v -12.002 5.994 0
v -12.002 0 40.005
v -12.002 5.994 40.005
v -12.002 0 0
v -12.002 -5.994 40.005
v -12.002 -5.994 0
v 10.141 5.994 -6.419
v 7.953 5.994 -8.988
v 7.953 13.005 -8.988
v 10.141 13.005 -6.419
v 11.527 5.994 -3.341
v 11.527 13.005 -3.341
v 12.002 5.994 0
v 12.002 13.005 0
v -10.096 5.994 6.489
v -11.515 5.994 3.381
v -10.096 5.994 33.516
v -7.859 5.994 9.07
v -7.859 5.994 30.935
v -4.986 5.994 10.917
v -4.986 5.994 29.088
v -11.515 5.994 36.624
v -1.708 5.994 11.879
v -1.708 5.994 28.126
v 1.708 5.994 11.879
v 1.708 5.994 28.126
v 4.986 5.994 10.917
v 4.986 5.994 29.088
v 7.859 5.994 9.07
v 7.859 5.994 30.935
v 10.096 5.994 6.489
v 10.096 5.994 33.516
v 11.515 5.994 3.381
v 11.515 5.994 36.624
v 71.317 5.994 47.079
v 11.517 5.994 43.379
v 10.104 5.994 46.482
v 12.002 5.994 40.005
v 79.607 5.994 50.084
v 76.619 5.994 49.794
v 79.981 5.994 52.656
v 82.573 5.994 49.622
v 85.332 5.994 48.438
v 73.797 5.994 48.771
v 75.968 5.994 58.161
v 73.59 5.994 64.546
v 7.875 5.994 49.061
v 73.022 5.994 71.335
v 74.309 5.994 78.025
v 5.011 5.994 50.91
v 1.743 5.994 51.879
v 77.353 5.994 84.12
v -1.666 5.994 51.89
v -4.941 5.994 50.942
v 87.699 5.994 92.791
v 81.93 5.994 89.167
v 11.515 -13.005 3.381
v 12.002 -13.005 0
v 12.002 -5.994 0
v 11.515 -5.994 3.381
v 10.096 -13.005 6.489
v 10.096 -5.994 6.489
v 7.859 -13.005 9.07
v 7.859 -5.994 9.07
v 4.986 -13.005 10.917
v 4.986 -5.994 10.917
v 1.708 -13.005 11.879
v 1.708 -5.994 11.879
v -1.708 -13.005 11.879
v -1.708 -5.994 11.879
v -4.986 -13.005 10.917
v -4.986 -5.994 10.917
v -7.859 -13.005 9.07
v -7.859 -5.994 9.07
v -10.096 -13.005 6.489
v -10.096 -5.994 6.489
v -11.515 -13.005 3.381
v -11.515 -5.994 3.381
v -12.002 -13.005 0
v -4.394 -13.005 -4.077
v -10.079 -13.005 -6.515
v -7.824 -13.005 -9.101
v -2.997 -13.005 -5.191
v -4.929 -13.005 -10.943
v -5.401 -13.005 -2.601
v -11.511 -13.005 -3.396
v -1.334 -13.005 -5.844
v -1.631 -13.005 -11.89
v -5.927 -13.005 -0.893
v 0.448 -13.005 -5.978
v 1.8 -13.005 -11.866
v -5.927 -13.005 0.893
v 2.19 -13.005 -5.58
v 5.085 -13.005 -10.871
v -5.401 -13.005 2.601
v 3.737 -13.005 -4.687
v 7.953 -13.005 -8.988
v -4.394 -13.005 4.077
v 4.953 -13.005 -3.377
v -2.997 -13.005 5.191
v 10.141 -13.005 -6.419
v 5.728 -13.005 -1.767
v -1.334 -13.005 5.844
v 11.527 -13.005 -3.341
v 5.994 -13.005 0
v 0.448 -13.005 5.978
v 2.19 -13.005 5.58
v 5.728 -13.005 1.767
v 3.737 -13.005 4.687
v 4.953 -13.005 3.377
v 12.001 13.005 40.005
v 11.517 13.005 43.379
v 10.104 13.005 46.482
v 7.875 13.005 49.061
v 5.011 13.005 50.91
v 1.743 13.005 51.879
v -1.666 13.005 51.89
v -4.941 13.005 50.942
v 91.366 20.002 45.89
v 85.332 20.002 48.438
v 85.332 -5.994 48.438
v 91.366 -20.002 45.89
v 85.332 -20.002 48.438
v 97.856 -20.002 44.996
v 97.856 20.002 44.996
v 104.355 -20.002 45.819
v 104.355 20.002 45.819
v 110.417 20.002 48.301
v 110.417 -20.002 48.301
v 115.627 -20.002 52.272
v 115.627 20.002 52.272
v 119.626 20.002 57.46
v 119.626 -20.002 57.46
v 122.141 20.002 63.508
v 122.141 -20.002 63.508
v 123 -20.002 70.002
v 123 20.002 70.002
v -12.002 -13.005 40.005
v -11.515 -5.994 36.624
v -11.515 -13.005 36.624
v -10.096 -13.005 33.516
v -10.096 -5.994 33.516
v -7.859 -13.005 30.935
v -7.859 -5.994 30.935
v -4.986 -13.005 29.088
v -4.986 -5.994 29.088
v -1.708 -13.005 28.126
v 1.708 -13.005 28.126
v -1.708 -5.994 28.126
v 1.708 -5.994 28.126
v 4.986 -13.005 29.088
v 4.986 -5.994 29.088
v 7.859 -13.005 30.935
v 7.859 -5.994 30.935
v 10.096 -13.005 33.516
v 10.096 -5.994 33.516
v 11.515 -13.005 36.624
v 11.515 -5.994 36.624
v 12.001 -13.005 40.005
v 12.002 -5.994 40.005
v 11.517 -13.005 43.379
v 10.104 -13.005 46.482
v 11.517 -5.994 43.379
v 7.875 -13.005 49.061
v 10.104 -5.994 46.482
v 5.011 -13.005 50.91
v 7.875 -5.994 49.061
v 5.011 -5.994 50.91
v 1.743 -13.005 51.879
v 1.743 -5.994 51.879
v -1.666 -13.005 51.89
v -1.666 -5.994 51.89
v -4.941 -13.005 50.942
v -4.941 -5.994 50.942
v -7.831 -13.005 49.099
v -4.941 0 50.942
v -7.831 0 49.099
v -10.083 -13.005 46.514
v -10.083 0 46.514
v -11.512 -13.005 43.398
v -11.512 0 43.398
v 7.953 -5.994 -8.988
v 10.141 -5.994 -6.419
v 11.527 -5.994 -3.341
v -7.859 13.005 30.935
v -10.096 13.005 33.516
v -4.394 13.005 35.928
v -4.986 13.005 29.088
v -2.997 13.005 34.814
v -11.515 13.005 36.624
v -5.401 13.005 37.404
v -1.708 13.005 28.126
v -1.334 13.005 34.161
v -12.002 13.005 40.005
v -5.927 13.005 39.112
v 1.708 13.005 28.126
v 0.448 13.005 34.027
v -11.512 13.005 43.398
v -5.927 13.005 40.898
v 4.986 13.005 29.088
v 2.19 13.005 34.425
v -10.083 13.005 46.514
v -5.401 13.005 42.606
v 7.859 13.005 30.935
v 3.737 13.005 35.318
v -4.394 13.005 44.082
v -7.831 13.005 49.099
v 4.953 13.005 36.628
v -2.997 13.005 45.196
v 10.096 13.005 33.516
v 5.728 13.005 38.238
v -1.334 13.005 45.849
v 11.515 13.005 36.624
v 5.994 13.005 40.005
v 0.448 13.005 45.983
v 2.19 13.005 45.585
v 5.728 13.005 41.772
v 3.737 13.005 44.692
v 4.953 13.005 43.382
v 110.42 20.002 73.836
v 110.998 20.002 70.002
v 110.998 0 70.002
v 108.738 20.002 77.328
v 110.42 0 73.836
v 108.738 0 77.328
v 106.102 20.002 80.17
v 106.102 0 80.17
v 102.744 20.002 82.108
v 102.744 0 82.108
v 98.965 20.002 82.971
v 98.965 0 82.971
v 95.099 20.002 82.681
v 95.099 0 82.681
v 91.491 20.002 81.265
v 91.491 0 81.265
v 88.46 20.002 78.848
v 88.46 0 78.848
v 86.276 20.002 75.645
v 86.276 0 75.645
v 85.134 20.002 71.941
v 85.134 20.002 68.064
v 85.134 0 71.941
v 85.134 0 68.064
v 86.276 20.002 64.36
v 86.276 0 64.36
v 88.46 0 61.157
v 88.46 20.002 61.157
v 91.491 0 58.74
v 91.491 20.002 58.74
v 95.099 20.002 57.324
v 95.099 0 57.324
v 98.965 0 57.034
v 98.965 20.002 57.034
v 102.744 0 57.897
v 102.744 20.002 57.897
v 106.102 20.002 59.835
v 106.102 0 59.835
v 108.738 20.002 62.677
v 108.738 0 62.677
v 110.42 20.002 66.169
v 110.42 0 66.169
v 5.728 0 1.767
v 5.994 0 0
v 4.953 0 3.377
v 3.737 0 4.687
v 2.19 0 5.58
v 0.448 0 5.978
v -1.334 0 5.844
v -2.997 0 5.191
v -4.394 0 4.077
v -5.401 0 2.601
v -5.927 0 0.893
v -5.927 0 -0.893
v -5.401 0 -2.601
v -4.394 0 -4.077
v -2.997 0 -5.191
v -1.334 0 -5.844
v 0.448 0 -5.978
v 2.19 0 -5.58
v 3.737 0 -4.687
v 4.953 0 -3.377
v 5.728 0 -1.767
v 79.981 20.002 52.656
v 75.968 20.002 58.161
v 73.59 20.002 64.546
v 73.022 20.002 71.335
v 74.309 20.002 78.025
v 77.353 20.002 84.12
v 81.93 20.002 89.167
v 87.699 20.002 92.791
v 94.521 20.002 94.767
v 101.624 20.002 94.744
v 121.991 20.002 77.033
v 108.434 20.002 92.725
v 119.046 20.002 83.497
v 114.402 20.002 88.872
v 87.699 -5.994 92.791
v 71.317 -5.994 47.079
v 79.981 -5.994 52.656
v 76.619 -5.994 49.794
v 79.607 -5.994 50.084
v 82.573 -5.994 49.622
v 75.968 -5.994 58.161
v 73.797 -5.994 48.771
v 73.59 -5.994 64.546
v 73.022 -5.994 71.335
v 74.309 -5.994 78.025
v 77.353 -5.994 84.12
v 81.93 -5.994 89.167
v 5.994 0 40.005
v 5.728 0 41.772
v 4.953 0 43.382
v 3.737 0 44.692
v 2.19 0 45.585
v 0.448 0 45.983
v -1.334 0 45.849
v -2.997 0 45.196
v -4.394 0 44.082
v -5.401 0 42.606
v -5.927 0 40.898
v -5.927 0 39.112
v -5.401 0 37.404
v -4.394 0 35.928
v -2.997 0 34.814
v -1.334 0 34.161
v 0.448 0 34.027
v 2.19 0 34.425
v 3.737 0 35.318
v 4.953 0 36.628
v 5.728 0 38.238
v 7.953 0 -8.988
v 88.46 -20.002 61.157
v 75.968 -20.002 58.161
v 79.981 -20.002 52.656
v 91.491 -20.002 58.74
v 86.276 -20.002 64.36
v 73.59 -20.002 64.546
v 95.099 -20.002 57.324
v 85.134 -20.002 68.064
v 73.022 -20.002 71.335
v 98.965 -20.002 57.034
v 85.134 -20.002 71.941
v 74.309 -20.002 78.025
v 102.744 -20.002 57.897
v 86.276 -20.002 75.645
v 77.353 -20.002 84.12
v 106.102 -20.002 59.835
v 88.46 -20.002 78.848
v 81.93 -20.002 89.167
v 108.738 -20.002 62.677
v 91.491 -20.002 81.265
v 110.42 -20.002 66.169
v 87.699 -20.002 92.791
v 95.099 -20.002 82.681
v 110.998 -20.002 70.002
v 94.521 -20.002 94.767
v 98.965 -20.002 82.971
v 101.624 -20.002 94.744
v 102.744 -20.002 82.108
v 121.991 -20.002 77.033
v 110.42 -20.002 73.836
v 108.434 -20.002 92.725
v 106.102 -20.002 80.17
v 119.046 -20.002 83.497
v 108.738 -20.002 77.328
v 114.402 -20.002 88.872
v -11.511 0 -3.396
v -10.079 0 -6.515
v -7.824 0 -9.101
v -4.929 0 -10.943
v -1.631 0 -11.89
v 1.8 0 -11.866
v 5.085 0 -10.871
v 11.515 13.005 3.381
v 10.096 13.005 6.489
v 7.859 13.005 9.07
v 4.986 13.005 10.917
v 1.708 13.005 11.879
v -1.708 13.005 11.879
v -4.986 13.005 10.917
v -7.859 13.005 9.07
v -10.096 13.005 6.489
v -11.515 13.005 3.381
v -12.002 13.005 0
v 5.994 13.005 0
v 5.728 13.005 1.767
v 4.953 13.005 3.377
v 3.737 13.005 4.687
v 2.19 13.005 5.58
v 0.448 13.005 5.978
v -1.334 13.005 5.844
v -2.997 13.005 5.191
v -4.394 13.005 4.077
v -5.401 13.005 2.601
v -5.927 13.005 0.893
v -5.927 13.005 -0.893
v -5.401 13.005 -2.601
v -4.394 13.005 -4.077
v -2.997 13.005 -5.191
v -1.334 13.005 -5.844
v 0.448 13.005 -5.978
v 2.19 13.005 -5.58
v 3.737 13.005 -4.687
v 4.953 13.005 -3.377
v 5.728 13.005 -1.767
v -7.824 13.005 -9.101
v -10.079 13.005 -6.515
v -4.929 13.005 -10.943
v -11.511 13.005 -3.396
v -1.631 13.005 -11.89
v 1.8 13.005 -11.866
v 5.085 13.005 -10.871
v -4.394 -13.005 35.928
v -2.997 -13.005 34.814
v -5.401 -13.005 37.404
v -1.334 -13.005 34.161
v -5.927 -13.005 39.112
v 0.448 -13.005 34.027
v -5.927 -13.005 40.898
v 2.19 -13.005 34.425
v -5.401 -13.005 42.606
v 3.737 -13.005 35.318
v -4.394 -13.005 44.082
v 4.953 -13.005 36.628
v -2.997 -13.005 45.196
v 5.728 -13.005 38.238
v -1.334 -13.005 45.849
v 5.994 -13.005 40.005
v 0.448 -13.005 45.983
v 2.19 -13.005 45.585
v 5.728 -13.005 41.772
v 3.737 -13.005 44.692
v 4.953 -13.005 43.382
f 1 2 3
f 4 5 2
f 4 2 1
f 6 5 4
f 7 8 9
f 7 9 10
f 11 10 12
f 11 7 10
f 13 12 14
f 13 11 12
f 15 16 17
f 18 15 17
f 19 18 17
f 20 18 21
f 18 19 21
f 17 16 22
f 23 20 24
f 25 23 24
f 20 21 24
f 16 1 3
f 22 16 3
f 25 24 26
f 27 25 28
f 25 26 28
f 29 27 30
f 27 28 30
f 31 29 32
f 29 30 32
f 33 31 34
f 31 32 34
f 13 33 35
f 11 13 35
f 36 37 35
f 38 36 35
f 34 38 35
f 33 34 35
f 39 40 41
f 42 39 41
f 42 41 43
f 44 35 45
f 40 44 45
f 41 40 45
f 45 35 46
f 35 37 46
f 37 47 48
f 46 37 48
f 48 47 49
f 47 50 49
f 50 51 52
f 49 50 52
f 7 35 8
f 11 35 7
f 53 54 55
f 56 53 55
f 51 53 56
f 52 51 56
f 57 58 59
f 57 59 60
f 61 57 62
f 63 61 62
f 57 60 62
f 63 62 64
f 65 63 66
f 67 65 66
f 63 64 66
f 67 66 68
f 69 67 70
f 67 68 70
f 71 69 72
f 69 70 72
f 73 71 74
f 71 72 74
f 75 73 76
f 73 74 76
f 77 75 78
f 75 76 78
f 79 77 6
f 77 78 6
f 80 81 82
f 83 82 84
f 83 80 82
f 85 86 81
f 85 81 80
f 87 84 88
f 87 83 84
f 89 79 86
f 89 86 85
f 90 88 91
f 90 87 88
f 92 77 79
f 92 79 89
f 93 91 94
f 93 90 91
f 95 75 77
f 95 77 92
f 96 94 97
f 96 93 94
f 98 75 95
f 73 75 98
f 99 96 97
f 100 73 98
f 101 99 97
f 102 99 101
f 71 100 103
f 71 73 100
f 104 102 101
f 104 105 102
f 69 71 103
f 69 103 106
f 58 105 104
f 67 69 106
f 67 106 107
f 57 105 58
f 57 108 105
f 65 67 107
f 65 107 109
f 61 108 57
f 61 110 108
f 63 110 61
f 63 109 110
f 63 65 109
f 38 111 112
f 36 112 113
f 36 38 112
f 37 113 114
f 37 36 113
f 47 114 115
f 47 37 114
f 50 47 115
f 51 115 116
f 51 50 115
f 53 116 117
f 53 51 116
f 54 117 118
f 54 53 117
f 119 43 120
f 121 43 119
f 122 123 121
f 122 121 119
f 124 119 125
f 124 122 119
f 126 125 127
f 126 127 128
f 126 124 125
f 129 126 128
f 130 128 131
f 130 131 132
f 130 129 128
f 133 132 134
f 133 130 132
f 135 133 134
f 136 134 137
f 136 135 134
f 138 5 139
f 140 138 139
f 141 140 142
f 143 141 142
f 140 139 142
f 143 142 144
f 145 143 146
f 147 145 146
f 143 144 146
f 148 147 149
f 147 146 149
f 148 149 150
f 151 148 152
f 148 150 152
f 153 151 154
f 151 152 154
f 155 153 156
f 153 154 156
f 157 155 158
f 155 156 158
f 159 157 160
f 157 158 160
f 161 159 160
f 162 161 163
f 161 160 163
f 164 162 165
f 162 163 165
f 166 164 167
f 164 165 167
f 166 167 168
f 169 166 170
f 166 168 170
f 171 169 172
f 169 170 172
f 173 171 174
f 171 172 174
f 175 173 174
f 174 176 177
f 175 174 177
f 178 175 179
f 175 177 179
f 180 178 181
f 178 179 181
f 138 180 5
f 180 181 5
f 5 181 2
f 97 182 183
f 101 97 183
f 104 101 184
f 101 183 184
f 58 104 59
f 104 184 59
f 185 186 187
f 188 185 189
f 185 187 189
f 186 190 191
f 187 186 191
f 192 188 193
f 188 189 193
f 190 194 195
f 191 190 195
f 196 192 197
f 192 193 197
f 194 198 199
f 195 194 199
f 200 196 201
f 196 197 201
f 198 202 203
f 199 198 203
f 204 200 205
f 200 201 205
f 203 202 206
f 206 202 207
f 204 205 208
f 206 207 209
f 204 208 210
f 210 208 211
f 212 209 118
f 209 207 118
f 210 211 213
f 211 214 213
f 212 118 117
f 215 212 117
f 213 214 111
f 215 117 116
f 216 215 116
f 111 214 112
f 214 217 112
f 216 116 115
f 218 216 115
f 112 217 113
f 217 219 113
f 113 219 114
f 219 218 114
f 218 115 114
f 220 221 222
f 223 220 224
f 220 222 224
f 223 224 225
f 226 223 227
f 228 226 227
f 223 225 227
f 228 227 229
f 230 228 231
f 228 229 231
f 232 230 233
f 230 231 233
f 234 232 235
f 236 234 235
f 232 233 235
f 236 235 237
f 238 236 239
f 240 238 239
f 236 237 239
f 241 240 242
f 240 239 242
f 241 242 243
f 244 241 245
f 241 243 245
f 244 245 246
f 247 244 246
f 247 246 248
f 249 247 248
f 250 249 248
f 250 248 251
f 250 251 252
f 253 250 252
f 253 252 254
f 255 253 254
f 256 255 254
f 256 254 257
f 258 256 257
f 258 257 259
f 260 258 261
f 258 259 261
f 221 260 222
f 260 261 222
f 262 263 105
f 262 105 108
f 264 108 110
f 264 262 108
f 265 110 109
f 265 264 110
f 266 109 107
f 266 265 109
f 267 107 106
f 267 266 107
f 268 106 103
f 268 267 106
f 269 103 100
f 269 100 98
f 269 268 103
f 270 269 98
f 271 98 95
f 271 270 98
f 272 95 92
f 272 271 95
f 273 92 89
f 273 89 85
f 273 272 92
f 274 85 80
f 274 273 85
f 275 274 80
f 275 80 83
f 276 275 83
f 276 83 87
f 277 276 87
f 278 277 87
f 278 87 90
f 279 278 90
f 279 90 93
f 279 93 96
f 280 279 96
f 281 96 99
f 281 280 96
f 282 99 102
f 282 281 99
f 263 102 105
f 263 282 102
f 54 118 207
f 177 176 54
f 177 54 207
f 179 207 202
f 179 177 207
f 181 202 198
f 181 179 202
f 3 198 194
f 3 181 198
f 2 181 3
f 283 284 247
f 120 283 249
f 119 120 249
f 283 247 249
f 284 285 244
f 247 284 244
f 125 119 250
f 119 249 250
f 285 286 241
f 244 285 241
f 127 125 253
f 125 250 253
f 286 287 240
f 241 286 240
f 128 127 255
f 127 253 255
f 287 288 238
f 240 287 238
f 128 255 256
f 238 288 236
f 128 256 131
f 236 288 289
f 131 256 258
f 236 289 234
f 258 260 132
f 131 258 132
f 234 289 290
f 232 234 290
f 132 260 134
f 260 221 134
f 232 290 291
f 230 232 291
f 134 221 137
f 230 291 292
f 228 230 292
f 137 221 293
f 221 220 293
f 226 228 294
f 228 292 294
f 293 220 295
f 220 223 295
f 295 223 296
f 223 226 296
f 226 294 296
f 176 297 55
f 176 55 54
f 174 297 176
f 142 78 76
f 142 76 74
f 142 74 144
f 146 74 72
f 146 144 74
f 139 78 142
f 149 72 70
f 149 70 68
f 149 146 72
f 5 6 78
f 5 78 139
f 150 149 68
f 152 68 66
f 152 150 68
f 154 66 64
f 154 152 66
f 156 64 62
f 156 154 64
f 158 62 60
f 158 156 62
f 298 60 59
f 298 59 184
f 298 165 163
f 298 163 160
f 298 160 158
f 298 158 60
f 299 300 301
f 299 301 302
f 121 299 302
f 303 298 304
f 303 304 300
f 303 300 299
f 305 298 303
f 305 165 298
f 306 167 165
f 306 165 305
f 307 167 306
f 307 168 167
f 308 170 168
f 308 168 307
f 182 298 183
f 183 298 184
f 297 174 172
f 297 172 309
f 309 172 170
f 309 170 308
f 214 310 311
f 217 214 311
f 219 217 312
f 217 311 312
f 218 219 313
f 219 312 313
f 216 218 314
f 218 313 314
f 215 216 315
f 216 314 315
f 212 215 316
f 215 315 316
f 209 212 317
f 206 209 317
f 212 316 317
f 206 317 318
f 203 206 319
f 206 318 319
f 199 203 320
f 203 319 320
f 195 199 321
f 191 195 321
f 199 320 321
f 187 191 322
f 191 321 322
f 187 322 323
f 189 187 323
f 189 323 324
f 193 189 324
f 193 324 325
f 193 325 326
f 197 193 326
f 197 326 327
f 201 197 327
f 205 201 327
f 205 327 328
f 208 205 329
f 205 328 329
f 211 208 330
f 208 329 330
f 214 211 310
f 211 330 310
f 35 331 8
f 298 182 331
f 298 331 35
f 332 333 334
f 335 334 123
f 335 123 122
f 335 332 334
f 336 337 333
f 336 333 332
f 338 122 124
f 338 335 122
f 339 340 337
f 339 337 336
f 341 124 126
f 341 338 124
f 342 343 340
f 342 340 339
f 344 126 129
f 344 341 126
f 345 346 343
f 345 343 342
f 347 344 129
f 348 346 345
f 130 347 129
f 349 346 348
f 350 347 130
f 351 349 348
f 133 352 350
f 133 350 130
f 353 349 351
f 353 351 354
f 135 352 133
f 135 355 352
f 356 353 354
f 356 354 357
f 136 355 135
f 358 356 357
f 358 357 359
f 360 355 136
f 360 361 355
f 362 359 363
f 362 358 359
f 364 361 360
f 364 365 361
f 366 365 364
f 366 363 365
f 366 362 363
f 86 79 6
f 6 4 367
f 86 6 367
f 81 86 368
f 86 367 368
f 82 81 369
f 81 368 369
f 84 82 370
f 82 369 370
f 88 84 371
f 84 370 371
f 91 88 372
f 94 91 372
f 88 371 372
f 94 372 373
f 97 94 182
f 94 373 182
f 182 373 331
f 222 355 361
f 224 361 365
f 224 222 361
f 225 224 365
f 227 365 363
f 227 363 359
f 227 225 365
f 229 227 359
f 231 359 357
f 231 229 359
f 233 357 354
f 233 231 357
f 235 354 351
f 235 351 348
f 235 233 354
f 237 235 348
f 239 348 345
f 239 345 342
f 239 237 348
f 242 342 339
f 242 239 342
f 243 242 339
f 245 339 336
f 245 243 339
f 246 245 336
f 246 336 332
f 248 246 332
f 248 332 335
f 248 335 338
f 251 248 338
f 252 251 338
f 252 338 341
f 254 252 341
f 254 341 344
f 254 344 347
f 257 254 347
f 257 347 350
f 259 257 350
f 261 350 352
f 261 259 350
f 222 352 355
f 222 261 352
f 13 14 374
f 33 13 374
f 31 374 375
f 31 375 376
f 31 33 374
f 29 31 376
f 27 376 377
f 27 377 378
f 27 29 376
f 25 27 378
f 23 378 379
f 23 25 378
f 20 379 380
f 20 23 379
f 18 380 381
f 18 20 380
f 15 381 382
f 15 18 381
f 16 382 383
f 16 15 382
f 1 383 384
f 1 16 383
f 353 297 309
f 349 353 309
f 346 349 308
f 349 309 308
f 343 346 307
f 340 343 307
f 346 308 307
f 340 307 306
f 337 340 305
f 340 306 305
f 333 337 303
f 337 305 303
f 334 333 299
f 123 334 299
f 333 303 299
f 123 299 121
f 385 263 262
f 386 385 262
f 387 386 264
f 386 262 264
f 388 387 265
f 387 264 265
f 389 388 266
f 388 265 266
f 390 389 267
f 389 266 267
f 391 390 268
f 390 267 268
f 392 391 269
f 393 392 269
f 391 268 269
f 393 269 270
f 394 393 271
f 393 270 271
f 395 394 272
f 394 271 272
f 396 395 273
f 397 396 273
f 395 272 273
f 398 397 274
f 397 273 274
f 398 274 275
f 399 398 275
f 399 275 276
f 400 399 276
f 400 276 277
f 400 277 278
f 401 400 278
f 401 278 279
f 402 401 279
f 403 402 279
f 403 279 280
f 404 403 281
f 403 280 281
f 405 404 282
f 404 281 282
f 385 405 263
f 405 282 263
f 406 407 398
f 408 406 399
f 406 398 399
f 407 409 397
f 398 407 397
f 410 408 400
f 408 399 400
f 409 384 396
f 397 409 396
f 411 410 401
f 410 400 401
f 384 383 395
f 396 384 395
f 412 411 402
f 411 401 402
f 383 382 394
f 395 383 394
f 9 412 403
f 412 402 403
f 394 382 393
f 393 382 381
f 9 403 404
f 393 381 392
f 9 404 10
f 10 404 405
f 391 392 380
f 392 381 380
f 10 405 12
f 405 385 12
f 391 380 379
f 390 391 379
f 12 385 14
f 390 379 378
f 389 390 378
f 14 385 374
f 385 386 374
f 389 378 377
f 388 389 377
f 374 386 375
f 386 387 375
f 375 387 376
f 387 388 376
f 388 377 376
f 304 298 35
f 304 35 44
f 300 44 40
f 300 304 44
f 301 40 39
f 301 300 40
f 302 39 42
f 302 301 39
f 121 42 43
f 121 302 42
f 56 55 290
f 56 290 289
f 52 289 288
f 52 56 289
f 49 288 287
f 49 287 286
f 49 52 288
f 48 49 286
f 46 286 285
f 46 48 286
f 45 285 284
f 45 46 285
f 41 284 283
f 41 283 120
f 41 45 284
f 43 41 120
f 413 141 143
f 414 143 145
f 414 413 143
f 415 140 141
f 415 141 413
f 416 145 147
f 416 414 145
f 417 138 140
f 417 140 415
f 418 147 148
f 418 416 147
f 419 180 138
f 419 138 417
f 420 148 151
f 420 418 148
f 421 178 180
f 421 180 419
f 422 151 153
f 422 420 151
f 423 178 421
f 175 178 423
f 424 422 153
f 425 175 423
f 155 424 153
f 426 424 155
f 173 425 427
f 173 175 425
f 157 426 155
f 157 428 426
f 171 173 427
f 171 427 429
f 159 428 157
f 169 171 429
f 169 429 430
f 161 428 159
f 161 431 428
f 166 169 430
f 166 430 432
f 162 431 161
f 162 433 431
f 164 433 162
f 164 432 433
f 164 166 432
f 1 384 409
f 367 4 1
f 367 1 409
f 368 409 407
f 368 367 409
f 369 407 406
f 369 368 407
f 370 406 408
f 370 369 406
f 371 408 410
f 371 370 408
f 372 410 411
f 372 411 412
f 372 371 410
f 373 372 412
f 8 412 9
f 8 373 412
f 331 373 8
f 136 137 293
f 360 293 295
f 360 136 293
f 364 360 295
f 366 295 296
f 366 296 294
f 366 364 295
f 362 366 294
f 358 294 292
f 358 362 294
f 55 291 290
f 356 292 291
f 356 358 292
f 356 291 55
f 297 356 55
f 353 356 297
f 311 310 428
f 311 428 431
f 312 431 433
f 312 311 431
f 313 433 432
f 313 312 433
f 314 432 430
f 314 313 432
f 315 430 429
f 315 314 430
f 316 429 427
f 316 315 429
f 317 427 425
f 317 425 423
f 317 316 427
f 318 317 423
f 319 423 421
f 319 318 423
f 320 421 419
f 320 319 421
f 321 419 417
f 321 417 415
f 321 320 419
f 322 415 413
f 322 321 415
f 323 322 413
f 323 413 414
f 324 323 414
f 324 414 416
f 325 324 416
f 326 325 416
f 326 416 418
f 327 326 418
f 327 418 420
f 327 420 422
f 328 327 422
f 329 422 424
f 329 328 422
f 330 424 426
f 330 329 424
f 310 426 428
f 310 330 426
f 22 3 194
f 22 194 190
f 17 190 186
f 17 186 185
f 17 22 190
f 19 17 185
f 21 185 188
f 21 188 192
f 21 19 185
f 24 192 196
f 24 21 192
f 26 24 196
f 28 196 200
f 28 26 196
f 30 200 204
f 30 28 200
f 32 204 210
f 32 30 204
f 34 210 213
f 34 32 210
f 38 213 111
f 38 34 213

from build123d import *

# Parameters (mm, degrees)
F1_DEPTH = 5.9944
F0_R     = 5.9944
F2_DEPTH = 13.0048
F0_R_2   = 13.0048
F3_DEPTH = 20.0025


with BuildPart() as f1:
    # F0 (on Front) → F1 (new body)
    with BuildSketch(Plane.XZ):
        with BuildLine():
            ThreePointArc((-12.0015, 0), (0, 12.0015), (12.0015, 0))
            ThreePointArc((12.0015, 0), (10.942664, -4.928905), (7.952988, -8.988102))
            Line((7.952988, -8.988102), (71.316989, 47.078591))
            ThreePointArc((71.316989, 47.078591), (78.103737, 50.03276), (85.331821, 48.438437))
            ThreePointArc((85.331821, 48.438437), (73.022425, 71.33485), (87.698507, 92.791308))
            Line((87.698507, 92.791308), (-4.940825, 50.942287))
            ThreePointArc((-4.940825, 50.942287), (6.509174, 50.087989), (12.0015, 40.005))
            ThreePointArc((12.0015, 40.005), (0, 28.0035), (-12.0015, 40.005))
            Line((-12.0015, 40.005), (-12.0015, 0))
        make_face()
    extrude(amount=F1_DEPTH)

    # F0 (on Front) → F2 (join)
    with BuildSketch(Plane.XZ):
        with BuildLine():
            ThreePointArc((-4.940825, 50.942287), (-10.082989, 46.514174), (-12.0015, 40.005))
            ThreePointArc((-12.0015, 40.005), (0, 28.0035), (12.0015, 40.005))
            ThreePointArc((12.0015, 40.005), (6.509174, 50.087989), (-4.940825, 50.942287))
        make_face()
        with Locations((0, 40.005)):
            Circle(F0_R, mode=Mode.SUBTRACT)
        with BuildLine():
            ThreePointArc((7.952988, -8.988102), (10.942664, -4.928905), (12.0015, 0))
            ThreePointArc((12.0015, 0), (0, 12.0015), (-12.0015, 0))
            ThreePointArc((-12.0015, 0), (-4.928905, -10.942664), (7.952988, -8.988102))
        make_face()
        Circle(F0_R, mode=Mode.SUBTRACT)
    extrude(amount=F2_DEPTH)

    # F0 (on Front) → F3 (join)
    with BuildSketch(Plane.XZ):
        with BuildLine():
            ThreePointArc((87.698507, 92.791308), (73.022425, 71.33485), (85.331821, 48.438437))
            ThreePointArc((85.331821, 48.438437), (110.416984, 48.30068), (122.9995, 70.0024))
            ThreePointArc((122.9995, 70.0024), (111.555701, 91.011294), (87.698507, 92.791308))
        make_face()
        with Locations((97.9932, 70.0024)):
            Circle(F0_R_2, mode=Mode.SUBTRACT)
    extrude(amount=F3_DEPTH)

    # F4: F1 across plane


with BuildPart() as f1_1:
    add(f1.part)
    add(f1.part.mirror(Plane.XZ))


solid = f1_1.part
